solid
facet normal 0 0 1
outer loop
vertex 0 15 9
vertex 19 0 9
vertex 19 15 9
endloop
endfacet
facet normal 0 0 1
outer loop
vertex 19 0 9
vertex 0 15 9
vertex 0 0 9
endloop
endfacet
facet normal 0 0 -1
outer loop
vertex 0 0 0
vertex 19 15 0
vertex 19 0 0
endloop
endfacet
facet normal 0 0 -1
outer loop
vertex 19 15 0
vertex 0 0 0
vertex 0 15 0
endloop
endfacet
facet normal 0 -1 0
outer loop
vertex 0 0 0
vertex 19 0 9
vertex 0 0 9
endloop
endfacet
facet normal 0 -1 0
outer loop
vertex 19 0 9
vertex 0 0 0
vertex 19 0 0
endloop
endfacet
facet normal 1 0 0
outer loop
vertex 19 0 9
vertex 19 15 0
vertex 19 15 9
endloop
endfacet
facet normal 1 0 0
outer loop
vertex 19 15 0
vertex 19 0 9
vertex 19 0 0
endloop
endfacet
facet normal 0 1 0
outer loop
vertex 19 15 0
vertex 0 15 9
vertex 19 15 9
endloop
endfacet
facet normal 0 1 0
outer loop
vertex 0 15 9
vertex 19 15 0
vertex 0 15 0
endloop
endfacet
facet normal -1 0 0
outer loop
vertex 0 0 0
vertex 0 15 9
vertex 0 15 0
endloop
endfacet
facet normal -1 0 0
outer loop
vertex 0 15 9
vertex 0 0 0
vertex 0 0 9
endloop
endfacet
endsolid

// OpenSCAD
// Generated by SolidPython 1.0.1 on 2020-07-29 00:46:56


cube(size = [19, 15, 9]);
/***********************************************
*********      SolidPython code:      **********
************************************************
 
# import packages: SolidPython
from solid import *
from solid.utils import *
from itertools import chain, combinations, permutations


class Resize:

    def __init__(self, scad_file):
        self.scad_file = scad_file
        #self.scad_file = import_scad(scad_file)
        # cone/cylinder param:
        self.r1 = 0
        self.r2 = 0
        self.h = 0
        # rectangular prism param:
        self.w = 0
        self.l = 0
        # ellipse param:
        self.r = 0

    # import OpenScad code (file name corresponds to shape)


    # classify shape + parameters
    def assign(self, param1, param2, param3):
        if self.scad_file == 'cone.scad':
            self.r1 = param1
            self.r2 = param2
            self.h = param3
        elif self.scad_file == 'cylinder.scad':
            self.r1 = param1
            self.r2 = param2
            self.h = param3
        elif self.scad_file == 'rectangularPrism.scad':
            self.h = param1
            self.l = param2
            self.w = param3
        else:
            self.r = param1
            self.h = param2

    # resize parameters
    def iterate(self):
        x = range(3, 20, 2)
        i = 1
        if self.scad_file == 'cone.scad':
            tempList = list(permutations(x, 2))
            for temp in tempList:
                param1 = temp[0]
                param2 = temp[1]
                filepath = 'produced_scad_files/' + 'cone' + str(param1) + '_' + str(param2) + '_' + '.scad'
                scad_render_to_file(cylinder(h=param1, r1=param2, r2=0), filepath)

        elif self.scad_file == 'cylinder.scad':
            tempList = list(permutations(x, 3))
            for temp in tempList:
                param1 = temp[0]
                param2 = temp[1]
                filepath = 'produced_scad_files/' + 'cylinder' + str(param1) + '_' + str(param2) + '_' + '.scad'
                scad_render_to_file(cylinder(h=param1, r1=param2, r2=param2), filepath)

        elif self.scad_file == 'rectangularPrism.scad':
            tempList = list(permutations(x, 3))
            for temp in tempList:
                param1 = temp[0]
                param2 = temp[1]
                param3 = temp[2]
                filepath = 'produced_scad_files/' + 'rectangularPrism' + str(param1) + '_' + str(param2) + '_' + str(
                    param3) + '.scad'
                scad_render_to_file(cube(size=(param1, param2, param3)), filepath)

        elif self.scad_file == 'ellipse.scad':
            tempList = list(permutations(x, 4))
            for temp in tempList:
                param1 = temp[0]
                param2 = temp[1]
                param3 = temp[2]
                param4 = temp[3]
                filepath = 'produced_scad_files/' + 'ellipse' + str(param1) + '_' + str(param2) + '_' + str(param3) + '_' + str(param4) + '.scad'
                scad_render_to_file(scale([param1, param2, param3])(sphere(r=param4)), filepath)

    def render_to_scadfile(self):
        scad_render_to_file(scad, 'example.scad') 
 
************************************************/
